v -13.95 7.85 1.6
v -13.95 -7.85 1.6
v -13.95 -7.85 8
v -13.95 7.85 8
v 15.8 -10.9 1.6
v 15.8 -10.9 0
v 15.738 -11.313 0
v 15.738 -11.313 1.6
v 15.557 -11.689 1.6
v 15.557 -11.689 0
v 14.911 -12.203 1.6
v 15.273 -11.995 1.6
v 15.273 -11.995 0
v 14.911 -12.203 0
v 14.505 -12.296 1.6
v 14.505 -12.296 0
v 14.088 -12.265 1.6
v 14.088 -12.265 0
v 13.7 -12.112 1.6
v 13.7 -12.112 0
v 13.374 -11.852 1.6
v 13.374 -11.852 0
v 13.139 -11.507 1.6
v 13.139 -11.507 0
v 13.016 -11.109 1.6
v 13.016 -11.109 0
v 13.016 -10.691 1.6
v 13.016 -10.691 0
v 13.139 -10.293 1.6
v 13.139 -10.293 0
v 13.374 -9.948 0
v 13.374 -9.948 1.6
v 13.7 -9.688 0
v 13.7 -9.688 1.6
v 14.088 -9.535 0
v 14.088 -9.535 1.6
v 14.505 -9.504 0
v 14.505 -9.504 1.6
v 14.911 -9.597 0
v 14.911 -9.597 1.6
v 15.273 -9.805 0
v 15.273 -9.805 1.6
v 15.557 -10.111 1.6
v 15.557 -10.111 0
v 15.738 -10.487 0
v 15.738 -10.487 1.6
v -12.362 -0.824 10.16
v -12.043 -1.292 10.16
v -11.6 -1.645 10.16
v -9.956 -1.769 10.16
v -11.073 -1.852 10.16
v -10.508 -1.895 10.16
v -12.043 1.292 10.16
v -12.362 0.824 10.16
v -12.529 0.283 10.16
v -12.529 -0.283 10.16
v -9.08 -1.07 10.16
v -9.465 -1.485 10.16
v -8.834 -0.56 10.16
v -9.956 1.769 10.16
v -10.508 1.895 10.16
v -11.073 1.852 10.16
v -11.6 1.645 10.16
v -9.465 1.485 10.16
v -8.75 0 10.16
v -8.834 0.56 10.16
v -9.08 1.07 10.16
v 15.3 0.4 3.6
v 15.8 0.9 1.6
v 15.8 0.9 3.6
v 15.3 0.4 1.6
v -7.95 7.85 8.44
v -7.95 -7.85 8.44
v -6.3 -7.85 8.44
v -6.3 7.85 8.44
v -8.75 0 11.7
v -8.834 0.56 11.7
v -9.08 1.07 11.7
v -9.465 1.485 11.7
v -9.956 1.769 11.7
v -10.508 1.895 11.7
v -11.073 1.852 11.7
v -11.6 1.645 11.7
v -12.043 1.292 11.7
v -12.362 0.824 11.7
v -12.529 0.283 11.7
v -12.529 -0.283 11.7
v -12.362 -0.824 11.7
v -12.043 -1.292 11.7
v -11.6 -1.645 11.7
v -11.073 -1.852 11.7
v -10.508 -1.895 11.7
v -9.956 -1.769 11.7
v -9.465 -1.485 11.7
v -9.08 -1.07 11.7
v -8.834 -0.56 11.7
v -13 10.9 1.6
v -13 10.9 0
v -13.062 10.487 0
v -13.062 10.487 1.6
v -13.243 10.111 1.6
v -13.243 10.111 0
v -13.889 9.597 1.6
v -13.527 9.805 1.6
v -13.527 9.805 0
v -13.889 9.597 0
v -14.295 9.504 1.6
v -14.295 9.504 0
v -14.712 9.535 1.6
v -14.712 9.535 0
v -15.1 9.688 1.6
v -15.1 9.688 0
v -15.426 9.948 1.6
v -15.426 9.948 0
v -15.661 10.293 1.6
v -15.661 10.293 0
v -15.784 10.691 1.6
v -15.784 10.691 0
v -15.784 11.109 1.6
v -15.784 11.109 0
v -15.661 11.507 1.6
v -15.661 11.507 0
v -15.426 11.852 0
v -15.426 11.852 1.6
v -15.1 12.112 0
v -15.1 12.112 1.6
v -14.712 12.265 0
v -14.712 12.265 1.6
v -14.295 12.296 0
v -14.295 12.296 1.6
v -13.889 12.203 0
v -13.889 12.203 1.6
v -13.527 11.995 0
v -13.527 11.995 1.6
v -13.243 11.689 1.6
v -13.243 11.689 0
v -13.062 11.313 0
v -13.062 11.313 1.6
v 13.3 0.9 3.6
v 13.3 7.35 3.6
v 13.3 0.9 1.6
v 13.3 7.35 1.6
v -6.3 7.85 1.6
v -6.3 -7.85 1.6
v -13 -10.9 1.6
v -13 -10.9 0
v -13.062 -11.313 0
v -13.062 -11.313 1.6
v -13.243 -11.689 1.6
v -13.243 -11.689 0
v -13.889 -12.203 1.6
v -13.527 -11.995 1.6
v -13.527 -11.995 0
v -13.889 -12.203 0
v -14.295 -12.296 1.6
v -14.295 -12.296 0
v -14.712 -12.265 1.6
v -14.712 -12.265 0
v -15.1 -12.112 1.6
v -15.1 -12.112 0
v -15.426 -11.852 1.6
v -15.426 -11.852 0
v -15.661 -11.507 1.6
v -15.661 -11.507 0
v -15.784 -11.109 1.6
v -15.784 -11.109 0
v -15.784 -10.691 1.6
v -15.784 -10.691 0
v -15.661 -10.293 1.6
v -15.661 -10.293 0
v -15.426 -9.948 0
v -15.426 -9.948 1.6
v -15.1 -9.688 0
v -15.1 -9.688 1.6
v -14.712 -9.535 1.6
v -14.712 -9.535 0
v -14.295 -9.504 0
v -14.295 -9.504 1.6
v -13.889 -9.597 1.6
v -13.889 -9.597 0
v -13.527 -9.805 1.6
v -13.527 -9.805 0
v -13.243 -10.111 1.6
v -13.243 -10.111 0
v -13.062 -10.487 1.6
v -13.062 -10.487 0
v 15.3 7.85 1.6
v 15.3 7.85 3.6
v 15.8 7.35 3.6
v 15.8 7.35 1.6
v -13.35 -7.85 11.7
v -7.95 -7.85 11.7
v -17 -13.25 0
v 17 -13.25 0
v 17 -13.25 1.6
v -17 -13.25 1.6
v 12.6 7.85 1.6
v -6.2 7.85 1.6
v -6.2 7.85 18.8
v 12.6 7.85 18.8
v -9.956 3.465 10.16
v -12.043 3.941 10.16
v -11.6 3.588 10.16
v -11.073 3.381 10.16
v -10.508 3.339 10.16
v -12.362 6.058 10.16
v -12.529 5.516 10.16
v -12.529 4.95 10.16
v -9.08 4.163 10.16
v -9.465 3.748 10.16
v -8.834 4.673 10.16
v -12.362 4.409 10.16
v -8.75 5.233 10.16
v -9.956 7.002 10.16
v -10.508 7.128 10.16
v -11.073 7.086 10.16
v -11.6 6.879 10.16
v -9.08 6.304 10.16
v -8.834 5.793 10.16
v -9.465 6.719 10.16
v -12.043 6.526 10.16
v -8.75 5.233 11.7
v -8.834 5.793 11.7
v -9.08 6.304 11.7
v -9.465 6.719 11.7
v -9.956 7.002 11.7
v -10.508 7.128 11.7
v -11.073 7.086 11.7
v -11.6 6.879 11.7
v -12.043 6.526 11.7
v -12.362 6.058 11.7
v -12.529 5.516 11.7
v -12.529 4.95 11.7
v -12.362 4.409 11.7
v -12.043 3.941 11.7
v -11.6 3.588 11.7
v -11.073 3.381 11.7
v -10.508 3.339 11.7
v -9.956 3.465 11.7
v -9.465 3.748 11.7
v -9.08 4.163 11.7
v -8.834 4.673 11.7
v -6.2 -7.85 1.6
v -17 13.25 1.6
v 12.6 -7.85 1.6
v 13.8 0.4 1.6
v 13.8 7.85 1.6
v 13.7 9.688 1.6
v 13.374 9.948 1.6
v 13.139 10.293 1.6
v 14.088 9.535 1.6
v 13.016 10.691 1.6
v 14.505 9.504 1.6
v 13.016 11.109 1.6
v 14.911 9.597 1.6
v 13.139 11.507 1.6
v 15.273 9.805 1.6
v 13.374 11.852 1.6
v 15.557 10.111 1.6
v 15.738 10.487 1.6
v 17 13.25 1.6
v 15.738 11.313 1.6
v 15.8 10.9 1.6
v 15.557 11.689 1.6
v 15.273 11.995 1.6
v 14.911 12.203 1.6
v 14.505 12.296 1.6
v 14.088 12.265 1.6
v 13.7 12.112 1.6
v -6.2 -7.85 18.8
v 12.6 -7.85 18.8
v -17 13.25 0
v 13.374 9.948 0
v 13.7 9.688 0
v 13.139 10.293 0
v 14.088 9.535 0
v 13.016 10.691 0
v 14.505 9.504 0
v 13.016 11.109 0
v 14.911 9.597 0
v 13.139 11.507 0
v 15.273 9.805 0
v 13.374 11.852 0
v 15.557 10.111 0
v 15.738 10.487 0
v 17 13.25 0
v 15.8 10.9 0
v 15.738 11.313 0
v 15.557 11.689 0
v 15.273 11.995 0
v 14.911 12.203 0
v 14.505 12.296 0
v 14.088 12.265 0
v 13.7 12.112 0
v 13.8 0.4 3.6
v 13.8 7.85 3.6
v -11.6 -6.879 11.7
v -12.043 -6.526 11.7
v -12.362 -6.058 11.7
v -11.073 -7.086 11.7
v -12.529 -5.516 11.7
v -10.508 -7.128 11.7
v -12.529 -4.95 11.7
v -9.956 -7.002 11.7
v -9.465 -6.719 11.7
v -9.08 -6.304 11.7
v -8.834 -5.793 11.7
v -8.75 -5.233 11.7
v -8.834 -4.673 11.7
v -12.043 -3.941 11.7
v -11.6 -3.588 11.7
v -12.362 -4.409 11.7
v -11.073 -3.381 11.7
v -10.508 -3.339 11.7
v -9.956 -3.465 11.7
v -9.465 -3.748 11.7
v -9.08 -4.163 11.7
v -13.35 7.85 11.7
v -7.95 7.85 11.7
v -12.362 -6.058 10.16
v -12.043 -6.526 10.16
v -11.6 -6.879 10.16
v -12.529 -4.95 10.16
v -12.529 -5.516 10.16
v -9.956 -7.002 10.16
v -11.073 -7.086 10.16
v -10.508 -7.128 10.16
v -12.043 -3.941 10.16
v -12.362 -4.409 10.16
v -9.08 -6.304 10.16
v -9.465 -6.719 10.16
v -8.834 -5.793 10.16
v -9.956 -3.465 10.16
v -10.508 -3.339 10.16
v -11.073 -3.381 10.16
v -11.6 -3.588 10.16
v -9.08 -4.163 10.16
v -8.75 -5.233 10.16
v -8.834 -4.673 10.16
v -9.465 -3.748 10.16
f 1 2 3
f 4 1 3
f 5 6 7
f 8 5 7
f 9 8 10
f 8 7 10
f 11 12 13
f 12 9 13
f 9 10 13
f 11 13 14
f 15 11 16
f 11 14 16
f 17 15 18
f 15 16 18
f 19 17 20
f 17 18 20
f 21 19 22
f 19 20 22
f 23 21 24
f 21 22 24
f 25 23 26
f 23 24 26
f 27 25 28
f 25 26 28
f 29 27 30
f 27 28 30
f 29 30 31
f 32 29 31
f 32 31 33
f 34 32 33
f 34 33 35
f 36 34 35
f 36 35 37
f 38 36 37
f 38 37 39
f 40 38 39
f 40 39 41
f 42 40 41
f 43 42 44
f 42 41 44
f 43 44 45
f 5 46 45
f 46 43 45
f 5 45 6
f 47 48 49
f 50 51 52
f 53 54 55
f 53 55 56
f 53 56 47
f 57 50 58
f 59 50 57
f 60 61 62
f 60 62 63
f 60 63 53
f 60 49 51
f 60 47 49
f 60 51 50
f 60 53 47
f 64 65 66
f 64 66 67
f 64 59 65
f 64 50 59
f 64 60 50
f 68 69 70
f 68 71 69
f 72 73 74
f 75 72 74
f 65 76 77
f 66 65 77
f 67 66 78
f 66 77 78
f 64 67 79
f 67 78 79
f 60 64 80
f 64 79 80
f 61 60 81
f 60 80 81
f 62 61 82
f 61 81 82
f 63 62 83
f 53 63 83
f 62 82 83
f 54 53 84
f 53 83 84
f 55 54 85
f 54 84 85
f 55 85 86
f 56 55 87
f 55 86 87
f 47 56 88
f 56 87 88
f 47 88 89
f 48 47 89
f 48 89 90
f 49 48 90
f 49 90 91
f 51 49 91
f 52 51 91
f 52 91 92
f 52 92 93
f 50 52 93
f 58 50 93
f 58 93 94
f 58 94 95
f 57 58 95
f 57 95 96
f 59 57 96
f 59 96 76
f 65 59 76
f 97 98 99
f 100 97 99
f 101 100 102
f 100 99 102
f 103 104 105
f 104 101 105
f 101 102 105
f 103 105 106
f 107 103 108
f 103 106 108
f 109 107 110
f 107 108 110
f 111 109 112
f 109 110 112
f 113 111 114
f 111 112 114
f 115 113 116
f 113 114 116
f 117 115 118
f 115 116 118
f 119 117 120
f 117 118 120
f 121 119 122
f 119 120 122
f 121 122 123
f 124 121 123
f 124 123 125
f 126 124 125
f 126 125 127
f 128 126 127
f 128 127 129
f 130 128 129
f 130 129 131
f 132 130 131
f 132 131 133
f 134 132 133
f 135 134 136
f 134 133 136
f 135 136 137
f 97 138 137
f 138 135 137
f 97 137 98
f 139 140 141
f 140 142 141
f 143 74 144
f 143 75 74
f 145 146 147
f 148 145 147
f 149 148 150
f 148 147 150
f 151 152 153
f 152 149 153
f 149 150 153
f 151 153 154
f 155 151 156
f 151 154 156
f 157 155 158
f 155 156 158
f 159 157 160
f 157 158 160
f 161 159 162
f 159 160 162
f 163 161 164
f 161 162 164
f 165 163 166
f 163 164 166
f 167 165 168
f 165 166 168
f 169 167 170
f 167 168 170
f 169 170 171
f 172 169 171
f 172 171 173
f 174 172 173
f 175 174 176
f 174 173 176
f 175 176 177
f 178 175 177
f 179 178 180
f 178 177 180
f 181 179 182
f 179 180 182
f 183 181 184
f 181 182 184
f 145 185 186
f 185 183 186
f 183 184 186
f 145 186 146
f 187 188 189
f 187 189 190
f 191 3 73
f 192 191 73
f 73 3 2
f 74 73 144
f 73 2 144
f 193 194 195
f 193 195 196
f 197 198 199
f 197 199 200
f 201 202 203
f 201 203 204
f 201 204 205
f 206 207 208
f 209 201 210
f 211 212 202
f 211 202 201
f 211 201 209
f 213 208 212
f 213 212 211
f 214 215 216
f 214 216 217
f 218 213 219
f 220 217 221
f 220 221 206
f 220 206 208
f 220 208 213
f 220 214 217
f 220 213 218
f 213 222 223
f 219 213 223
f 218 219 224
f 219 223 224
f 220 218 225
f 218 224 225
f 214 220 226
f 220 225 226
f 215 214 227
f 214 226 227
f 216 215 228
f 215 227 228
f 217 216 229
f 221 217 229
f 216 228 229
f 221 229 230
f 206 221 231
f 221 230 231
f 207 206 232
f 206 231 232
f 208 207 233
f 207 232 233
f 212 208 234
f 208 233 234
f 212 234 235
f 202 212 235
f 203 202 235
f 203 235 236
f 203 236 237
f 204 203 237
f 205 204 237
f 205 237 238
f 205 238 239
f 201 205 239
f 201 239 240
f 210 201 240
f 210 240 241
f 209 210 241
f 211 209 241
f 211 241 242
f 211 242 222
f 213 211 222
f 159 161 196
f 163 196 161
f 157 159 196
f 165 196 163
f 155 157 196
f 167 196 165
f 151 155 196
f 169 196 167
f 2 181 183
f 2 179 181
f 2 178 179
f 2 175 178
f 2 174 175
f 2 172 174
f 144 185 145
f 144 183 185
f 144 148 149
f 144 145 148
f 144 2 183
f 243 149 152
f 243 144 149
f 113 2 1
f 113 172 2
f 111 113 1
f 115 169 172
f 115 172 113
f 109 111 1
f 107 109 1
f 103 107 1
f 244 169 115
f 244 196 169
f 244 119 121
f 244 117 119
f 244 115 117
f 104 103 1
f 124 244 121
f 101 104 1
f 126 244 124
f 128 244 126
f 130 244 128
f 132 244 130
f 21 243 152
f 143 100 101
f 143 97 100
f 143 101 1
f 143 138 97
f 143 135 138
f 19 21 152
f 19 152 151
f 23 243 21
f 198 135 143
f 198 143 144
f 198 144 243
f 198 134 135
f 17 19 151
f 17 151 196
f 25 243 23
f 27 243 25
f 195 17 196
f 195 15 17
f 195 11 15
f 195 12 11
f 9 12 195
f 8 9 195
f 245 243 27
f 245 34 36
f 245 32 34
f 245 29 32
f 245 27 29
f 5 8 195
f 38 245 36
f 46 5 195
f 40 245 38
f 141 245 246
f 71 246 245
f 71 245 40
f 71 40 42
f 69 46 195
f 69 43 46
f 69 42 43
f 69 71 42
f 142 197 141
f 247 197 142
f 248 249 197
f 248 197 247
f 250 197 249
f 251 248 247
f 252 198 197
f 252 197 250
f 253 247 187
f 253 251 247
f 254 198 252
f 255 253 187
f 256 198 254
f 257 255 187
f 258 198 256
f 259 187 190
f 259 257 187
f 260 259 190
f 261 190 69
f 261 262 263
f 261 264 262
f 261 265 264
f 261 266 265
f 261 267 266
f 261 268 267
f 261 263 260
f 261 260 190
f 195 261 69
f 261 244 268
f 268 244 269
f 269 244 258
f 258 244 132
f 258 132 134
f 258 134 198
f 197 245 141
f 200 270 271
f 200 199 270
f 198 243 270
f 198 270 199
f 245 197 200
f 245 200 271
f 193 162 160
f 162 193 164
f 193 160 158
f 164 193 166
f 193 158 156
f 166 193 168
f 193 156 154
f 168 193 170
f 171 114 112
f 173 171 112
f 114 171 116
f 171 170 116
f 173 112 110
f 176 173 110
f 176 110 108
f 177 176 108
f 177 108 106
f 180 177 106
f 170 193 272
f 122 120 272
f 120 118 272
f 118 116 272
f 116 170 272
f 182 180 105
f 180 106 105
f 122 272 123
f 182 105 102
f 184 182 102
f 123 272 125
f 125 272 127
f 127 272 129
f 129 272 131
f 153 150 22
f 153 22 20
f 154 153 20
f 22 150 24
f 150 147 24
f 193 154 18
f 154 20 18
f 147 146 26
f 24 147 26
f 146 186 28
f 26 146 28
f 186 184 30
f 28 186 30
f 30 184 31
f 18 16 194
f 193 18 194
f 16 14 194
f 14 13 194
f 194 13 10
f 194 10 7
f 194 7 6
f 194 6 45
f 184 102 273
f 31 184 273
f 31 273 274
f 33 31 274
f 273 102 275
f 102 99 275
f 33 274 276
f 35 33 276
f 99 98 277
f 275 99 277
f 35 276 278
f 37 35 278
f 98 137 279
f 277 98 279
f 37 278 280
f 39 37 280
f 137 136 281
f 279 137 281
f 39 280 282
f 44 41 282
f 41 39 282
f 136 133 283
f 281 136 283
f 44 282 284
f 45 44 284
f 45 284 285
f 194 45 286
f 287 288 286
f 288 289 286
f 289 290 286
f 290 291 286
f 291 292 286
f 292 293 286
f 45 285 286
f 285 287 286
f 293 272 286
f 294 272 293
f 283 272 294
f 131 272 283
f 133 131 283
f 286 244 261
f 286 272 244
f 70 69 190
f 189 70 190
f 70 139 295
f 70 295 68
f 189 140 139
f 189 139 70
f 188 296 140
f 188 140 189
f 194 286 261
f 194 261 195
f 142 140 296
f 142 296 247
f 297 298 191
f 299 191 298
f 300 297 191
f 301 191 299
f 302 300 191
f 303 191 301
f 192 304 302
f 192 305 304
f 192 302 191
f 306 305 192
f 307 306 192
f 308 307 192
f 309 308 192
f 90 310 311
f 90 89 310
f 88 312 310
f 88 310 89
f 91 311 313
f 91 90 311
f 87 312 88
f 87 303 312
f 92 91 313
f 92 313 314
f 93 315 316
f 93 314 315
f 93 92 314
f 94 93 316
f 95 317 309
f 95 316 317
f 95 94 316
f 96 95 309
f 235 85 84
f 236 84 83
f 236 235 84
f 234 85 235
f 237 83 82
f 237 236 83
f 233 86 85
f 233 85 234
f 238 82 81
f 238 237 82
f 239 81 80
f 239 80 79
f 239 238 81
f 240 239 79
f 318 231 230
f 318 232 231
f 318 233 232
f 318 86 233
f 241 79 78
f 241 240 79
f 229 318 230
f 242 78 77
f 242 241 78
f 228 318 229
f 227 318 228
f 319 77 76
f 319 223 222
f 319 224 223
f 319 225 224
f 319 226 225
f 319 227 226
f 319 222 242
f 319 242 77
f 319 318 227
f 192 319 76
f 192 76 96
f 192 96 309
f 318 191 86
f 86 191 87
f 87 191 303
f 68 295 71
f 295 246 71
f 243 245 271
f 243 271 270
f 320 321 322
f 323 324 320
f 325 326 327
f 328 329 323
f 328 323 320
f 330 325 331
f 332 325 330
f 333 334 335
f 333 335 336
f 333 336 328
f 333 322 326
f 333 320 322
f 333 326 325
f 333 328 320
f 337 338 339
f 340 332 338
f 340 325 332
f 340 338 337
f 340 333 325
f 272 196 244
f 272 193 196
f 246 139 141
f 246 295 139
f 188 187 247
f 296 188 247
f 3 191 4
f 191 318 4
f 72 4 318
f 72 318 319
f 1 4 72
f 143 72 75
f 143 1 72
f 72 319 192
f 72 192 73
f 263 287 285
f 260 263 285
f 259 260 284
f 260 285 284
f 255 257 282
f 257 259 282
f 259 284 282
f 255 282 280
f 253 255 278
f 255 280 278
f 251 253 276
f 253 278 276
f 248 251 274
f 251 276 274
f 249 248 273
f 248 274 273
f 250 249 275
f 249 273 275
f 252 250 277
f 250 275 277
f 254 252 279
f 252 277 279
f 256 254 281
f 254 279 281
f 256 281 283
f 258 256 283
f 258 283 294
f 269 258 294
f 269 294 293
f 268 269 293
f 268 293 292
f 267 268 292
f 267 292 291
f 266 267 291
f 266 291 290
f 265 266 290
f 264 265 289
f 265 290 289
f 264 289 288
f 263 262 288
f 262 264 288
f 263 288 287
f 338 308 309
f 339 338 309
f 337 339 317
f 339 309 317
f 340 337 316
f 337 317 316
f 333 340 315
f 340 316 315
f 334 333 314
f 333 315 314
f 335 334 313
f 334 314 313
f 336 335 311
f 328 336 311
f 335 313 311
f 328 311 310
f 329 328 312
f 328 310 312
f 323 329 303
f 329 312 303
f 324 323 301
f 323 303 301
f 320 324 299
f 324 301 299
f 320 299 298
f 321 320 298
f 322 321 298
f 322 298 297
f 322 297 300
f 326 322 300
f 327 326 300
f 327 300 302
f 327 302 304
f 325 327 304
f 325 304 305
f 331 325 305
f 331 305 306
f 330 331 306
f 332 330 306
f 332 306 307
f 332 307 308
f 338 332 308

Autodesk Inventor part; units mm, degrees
ref_plane "YZ Plane" through (0, 0, 0) normal (1, 0, 0) x (0, 1, 0)
ref_plane "XZ Plane" through (0, 0, 0) normal (0, 1, 0) x (-1, 0, 0)
ref_plane "XY Plane" through (0, 0, 0) normal (0, 0, 1) x (1, 0, 0)
sketch "스케치1" plane through (0, 0, 0) normal (0, 0, 1) x (1, 0, 0)
  line L0 (-17, 13.25) -> (17, 13.25)
  line L1 (17, 13.25) -> (17, -13.25)
  line L2 (17, -13.25) -> (-17, -13.25)
  line L3 (-17, -13.25) -> (-17, 13.25)
  line L4 (-17, 13.25) -> (17, -13.25) construction
  line L5 (17, 13.25) -> (-17, -13.25) construction
  circle A0 centre (14.4, 10.9) radius 1.4
  line L6 (0, 0) -> (4.1971, 0)
  line L7 (0, 0) -> (0, 5.4603)
  circle A1 centre (-14.4, 10.9) radius 1.4
  circle A2 centre (14.4, -10.9) radius 1.4
  circle A3 centre (-14.4, -10.9) radius 1.4
  dimension "d0" = 34
  dimension "d1" = 26.5
  dimension "d2" = 28.8
  dimension "d3" = 2.8
  dimension "d4" = 21.8
extrude "돌출1" add sketch "스케치1" along normal blind 1.6
sketch "스케치2" plane through (0, 0, 1.6) normal (0, 0, 1) x (1, 0, 0)
  line L0 (12.6, -7.85) -> (-6.2, -7.85)
  line L1 (-6.2, -7.85) -> (-6.2, 7.85)
  line L2 (-6.2, 7.85) -> (12.6, 7.85)
  line L3 (12.6, 7.85) -> (12.6, -7.85)
  line L4 (12.6, -7.85) -> (-6.2, 7.85) construction
  line L5 (-6.2, -7.85) -> (12.6, 7.85) construction
  line L6 (17, -13.25) -> (17, 13.25) projected
  point P0 (0, 0)
  point P1 (3.2, 0)
  dimension "d7" = 15.7
  dimension "d8" = 18.8
  dimension "d9" = 4.4
extrude "돌출2" add sketch "스케치2" along normal blind 17.2
sketch "스케치3" plane through (-6.2, 7.85, 1.6) normal (0, 1, 0) x (1, 0, 0)
  line L0 (0, 0) -> (18.8, 0) projected
  line L1 (0, 0) -> (-1.75, 0)
  line L2 (-1.75, 0) -> (-1.75, -6.84)
  line L3 (-1.75, -6.84) -> (0, -6.84)
  line L4 (0, -6.84) -> (0, 0)
  line L5 (-1.75, 0) -> (-7.75, 0)
  line L6 (-7.75, 0) -> (-7.75, -10.1)
  line L7 (-7.75, -10.1) -> (-1.75, -10.1)
  line L8 (-1.75, -10.1) -> (-1.75, 0)
  line L9 (-7.15, -10.1) -> (-7.75, -6.4)
  line L10 (-0.1, -6.84) -> (-0.1, 0)
  line L11 (23.2, 0) -> (-10.8, 0) projected
  point P0 (6.2, 1.6)
  point P1 (-1.75, -6.84)
  dimension "d12" = 1.75
  dimension "d13" = 6.84
  dimension "d14" = 6
  dimension "d15" = 10.1
  dimension "d16" = 0.6
  dimension "d17" = 3.7
  dimension "d20" = 0.1
extrude "돌출3" add sketch "스케치3" against normal blind 15.7 contours L10 L3 L2 L1 | L2 L8 L7 L9 L6 L5
sketch "스케치4" plane through (-13.35, 7.85, 11.7) normal (0, 0, 1) x (1, 0, 0)
  line L0 (0, 0) -> (5.4, 0) projected
  line L1 (0, 0) -> (0, -15.7) projected
  line L2 (5.4, -15.7) -> (0, -15.7) projected
  line L3 (5.4, 0) -> (5.4, -15.7) projected
  line L4 (5.4, 0) -> (5.4, -15.7) projected
  line L5 (5.4, -7.85) -> (0, -7.85)
  circle A0 centre (2.7, -7.85) radius 1.9
  circle A1 centre (2.7, -13.0833) radius 1.9
  circle A2 centre (2.7, -2.6167) radius 1.9
  circle A3 centre (2.7, -7.85) radius 1.9
  point P0 (13.35, -7.85)
  dimension "d21" = 3.8
  dimension "d24" = 5.2333
  dimension "d27" = 5.2333
extrude "돌출4" cut sketch "스케치4" against normal blind 1.54 contours A0 L5 | L5 A0 | A1 | A2
sketch "스케치5" plane through (0, 0, 1.6) normal (0, 0, 1) x (1, 0, 0)
  line L0 (15.8, 7.85) -> (13.3, 7.85)
  line L1 (13.3, 7.85) -> (13.3, 0.4)
  line L2 (13.3, 0.4) -> (15.8, 0.4)
  line L3 (15.8, 0.4) -> (15.8, 7.85)
  line L4 (17, -13.25) -> (17, 13.25) projected
  point P0 (0, 0)
  dimension "d32" = 2.5
  dimension "d33" = 7.45
  dimension "d34" = 1.2
extrude "돌출5" add sketch "스케치5" along normal blind 2
chamfer "모따기1" distance 0.5 angle 45 4 edges at (15.8, 7.85, 2.6) (15.8, 0.4, 2.6) (13.3, 7.85, 2.6) (13.3, 0.4, 2.6)
properties part number "릴레이모듈"
